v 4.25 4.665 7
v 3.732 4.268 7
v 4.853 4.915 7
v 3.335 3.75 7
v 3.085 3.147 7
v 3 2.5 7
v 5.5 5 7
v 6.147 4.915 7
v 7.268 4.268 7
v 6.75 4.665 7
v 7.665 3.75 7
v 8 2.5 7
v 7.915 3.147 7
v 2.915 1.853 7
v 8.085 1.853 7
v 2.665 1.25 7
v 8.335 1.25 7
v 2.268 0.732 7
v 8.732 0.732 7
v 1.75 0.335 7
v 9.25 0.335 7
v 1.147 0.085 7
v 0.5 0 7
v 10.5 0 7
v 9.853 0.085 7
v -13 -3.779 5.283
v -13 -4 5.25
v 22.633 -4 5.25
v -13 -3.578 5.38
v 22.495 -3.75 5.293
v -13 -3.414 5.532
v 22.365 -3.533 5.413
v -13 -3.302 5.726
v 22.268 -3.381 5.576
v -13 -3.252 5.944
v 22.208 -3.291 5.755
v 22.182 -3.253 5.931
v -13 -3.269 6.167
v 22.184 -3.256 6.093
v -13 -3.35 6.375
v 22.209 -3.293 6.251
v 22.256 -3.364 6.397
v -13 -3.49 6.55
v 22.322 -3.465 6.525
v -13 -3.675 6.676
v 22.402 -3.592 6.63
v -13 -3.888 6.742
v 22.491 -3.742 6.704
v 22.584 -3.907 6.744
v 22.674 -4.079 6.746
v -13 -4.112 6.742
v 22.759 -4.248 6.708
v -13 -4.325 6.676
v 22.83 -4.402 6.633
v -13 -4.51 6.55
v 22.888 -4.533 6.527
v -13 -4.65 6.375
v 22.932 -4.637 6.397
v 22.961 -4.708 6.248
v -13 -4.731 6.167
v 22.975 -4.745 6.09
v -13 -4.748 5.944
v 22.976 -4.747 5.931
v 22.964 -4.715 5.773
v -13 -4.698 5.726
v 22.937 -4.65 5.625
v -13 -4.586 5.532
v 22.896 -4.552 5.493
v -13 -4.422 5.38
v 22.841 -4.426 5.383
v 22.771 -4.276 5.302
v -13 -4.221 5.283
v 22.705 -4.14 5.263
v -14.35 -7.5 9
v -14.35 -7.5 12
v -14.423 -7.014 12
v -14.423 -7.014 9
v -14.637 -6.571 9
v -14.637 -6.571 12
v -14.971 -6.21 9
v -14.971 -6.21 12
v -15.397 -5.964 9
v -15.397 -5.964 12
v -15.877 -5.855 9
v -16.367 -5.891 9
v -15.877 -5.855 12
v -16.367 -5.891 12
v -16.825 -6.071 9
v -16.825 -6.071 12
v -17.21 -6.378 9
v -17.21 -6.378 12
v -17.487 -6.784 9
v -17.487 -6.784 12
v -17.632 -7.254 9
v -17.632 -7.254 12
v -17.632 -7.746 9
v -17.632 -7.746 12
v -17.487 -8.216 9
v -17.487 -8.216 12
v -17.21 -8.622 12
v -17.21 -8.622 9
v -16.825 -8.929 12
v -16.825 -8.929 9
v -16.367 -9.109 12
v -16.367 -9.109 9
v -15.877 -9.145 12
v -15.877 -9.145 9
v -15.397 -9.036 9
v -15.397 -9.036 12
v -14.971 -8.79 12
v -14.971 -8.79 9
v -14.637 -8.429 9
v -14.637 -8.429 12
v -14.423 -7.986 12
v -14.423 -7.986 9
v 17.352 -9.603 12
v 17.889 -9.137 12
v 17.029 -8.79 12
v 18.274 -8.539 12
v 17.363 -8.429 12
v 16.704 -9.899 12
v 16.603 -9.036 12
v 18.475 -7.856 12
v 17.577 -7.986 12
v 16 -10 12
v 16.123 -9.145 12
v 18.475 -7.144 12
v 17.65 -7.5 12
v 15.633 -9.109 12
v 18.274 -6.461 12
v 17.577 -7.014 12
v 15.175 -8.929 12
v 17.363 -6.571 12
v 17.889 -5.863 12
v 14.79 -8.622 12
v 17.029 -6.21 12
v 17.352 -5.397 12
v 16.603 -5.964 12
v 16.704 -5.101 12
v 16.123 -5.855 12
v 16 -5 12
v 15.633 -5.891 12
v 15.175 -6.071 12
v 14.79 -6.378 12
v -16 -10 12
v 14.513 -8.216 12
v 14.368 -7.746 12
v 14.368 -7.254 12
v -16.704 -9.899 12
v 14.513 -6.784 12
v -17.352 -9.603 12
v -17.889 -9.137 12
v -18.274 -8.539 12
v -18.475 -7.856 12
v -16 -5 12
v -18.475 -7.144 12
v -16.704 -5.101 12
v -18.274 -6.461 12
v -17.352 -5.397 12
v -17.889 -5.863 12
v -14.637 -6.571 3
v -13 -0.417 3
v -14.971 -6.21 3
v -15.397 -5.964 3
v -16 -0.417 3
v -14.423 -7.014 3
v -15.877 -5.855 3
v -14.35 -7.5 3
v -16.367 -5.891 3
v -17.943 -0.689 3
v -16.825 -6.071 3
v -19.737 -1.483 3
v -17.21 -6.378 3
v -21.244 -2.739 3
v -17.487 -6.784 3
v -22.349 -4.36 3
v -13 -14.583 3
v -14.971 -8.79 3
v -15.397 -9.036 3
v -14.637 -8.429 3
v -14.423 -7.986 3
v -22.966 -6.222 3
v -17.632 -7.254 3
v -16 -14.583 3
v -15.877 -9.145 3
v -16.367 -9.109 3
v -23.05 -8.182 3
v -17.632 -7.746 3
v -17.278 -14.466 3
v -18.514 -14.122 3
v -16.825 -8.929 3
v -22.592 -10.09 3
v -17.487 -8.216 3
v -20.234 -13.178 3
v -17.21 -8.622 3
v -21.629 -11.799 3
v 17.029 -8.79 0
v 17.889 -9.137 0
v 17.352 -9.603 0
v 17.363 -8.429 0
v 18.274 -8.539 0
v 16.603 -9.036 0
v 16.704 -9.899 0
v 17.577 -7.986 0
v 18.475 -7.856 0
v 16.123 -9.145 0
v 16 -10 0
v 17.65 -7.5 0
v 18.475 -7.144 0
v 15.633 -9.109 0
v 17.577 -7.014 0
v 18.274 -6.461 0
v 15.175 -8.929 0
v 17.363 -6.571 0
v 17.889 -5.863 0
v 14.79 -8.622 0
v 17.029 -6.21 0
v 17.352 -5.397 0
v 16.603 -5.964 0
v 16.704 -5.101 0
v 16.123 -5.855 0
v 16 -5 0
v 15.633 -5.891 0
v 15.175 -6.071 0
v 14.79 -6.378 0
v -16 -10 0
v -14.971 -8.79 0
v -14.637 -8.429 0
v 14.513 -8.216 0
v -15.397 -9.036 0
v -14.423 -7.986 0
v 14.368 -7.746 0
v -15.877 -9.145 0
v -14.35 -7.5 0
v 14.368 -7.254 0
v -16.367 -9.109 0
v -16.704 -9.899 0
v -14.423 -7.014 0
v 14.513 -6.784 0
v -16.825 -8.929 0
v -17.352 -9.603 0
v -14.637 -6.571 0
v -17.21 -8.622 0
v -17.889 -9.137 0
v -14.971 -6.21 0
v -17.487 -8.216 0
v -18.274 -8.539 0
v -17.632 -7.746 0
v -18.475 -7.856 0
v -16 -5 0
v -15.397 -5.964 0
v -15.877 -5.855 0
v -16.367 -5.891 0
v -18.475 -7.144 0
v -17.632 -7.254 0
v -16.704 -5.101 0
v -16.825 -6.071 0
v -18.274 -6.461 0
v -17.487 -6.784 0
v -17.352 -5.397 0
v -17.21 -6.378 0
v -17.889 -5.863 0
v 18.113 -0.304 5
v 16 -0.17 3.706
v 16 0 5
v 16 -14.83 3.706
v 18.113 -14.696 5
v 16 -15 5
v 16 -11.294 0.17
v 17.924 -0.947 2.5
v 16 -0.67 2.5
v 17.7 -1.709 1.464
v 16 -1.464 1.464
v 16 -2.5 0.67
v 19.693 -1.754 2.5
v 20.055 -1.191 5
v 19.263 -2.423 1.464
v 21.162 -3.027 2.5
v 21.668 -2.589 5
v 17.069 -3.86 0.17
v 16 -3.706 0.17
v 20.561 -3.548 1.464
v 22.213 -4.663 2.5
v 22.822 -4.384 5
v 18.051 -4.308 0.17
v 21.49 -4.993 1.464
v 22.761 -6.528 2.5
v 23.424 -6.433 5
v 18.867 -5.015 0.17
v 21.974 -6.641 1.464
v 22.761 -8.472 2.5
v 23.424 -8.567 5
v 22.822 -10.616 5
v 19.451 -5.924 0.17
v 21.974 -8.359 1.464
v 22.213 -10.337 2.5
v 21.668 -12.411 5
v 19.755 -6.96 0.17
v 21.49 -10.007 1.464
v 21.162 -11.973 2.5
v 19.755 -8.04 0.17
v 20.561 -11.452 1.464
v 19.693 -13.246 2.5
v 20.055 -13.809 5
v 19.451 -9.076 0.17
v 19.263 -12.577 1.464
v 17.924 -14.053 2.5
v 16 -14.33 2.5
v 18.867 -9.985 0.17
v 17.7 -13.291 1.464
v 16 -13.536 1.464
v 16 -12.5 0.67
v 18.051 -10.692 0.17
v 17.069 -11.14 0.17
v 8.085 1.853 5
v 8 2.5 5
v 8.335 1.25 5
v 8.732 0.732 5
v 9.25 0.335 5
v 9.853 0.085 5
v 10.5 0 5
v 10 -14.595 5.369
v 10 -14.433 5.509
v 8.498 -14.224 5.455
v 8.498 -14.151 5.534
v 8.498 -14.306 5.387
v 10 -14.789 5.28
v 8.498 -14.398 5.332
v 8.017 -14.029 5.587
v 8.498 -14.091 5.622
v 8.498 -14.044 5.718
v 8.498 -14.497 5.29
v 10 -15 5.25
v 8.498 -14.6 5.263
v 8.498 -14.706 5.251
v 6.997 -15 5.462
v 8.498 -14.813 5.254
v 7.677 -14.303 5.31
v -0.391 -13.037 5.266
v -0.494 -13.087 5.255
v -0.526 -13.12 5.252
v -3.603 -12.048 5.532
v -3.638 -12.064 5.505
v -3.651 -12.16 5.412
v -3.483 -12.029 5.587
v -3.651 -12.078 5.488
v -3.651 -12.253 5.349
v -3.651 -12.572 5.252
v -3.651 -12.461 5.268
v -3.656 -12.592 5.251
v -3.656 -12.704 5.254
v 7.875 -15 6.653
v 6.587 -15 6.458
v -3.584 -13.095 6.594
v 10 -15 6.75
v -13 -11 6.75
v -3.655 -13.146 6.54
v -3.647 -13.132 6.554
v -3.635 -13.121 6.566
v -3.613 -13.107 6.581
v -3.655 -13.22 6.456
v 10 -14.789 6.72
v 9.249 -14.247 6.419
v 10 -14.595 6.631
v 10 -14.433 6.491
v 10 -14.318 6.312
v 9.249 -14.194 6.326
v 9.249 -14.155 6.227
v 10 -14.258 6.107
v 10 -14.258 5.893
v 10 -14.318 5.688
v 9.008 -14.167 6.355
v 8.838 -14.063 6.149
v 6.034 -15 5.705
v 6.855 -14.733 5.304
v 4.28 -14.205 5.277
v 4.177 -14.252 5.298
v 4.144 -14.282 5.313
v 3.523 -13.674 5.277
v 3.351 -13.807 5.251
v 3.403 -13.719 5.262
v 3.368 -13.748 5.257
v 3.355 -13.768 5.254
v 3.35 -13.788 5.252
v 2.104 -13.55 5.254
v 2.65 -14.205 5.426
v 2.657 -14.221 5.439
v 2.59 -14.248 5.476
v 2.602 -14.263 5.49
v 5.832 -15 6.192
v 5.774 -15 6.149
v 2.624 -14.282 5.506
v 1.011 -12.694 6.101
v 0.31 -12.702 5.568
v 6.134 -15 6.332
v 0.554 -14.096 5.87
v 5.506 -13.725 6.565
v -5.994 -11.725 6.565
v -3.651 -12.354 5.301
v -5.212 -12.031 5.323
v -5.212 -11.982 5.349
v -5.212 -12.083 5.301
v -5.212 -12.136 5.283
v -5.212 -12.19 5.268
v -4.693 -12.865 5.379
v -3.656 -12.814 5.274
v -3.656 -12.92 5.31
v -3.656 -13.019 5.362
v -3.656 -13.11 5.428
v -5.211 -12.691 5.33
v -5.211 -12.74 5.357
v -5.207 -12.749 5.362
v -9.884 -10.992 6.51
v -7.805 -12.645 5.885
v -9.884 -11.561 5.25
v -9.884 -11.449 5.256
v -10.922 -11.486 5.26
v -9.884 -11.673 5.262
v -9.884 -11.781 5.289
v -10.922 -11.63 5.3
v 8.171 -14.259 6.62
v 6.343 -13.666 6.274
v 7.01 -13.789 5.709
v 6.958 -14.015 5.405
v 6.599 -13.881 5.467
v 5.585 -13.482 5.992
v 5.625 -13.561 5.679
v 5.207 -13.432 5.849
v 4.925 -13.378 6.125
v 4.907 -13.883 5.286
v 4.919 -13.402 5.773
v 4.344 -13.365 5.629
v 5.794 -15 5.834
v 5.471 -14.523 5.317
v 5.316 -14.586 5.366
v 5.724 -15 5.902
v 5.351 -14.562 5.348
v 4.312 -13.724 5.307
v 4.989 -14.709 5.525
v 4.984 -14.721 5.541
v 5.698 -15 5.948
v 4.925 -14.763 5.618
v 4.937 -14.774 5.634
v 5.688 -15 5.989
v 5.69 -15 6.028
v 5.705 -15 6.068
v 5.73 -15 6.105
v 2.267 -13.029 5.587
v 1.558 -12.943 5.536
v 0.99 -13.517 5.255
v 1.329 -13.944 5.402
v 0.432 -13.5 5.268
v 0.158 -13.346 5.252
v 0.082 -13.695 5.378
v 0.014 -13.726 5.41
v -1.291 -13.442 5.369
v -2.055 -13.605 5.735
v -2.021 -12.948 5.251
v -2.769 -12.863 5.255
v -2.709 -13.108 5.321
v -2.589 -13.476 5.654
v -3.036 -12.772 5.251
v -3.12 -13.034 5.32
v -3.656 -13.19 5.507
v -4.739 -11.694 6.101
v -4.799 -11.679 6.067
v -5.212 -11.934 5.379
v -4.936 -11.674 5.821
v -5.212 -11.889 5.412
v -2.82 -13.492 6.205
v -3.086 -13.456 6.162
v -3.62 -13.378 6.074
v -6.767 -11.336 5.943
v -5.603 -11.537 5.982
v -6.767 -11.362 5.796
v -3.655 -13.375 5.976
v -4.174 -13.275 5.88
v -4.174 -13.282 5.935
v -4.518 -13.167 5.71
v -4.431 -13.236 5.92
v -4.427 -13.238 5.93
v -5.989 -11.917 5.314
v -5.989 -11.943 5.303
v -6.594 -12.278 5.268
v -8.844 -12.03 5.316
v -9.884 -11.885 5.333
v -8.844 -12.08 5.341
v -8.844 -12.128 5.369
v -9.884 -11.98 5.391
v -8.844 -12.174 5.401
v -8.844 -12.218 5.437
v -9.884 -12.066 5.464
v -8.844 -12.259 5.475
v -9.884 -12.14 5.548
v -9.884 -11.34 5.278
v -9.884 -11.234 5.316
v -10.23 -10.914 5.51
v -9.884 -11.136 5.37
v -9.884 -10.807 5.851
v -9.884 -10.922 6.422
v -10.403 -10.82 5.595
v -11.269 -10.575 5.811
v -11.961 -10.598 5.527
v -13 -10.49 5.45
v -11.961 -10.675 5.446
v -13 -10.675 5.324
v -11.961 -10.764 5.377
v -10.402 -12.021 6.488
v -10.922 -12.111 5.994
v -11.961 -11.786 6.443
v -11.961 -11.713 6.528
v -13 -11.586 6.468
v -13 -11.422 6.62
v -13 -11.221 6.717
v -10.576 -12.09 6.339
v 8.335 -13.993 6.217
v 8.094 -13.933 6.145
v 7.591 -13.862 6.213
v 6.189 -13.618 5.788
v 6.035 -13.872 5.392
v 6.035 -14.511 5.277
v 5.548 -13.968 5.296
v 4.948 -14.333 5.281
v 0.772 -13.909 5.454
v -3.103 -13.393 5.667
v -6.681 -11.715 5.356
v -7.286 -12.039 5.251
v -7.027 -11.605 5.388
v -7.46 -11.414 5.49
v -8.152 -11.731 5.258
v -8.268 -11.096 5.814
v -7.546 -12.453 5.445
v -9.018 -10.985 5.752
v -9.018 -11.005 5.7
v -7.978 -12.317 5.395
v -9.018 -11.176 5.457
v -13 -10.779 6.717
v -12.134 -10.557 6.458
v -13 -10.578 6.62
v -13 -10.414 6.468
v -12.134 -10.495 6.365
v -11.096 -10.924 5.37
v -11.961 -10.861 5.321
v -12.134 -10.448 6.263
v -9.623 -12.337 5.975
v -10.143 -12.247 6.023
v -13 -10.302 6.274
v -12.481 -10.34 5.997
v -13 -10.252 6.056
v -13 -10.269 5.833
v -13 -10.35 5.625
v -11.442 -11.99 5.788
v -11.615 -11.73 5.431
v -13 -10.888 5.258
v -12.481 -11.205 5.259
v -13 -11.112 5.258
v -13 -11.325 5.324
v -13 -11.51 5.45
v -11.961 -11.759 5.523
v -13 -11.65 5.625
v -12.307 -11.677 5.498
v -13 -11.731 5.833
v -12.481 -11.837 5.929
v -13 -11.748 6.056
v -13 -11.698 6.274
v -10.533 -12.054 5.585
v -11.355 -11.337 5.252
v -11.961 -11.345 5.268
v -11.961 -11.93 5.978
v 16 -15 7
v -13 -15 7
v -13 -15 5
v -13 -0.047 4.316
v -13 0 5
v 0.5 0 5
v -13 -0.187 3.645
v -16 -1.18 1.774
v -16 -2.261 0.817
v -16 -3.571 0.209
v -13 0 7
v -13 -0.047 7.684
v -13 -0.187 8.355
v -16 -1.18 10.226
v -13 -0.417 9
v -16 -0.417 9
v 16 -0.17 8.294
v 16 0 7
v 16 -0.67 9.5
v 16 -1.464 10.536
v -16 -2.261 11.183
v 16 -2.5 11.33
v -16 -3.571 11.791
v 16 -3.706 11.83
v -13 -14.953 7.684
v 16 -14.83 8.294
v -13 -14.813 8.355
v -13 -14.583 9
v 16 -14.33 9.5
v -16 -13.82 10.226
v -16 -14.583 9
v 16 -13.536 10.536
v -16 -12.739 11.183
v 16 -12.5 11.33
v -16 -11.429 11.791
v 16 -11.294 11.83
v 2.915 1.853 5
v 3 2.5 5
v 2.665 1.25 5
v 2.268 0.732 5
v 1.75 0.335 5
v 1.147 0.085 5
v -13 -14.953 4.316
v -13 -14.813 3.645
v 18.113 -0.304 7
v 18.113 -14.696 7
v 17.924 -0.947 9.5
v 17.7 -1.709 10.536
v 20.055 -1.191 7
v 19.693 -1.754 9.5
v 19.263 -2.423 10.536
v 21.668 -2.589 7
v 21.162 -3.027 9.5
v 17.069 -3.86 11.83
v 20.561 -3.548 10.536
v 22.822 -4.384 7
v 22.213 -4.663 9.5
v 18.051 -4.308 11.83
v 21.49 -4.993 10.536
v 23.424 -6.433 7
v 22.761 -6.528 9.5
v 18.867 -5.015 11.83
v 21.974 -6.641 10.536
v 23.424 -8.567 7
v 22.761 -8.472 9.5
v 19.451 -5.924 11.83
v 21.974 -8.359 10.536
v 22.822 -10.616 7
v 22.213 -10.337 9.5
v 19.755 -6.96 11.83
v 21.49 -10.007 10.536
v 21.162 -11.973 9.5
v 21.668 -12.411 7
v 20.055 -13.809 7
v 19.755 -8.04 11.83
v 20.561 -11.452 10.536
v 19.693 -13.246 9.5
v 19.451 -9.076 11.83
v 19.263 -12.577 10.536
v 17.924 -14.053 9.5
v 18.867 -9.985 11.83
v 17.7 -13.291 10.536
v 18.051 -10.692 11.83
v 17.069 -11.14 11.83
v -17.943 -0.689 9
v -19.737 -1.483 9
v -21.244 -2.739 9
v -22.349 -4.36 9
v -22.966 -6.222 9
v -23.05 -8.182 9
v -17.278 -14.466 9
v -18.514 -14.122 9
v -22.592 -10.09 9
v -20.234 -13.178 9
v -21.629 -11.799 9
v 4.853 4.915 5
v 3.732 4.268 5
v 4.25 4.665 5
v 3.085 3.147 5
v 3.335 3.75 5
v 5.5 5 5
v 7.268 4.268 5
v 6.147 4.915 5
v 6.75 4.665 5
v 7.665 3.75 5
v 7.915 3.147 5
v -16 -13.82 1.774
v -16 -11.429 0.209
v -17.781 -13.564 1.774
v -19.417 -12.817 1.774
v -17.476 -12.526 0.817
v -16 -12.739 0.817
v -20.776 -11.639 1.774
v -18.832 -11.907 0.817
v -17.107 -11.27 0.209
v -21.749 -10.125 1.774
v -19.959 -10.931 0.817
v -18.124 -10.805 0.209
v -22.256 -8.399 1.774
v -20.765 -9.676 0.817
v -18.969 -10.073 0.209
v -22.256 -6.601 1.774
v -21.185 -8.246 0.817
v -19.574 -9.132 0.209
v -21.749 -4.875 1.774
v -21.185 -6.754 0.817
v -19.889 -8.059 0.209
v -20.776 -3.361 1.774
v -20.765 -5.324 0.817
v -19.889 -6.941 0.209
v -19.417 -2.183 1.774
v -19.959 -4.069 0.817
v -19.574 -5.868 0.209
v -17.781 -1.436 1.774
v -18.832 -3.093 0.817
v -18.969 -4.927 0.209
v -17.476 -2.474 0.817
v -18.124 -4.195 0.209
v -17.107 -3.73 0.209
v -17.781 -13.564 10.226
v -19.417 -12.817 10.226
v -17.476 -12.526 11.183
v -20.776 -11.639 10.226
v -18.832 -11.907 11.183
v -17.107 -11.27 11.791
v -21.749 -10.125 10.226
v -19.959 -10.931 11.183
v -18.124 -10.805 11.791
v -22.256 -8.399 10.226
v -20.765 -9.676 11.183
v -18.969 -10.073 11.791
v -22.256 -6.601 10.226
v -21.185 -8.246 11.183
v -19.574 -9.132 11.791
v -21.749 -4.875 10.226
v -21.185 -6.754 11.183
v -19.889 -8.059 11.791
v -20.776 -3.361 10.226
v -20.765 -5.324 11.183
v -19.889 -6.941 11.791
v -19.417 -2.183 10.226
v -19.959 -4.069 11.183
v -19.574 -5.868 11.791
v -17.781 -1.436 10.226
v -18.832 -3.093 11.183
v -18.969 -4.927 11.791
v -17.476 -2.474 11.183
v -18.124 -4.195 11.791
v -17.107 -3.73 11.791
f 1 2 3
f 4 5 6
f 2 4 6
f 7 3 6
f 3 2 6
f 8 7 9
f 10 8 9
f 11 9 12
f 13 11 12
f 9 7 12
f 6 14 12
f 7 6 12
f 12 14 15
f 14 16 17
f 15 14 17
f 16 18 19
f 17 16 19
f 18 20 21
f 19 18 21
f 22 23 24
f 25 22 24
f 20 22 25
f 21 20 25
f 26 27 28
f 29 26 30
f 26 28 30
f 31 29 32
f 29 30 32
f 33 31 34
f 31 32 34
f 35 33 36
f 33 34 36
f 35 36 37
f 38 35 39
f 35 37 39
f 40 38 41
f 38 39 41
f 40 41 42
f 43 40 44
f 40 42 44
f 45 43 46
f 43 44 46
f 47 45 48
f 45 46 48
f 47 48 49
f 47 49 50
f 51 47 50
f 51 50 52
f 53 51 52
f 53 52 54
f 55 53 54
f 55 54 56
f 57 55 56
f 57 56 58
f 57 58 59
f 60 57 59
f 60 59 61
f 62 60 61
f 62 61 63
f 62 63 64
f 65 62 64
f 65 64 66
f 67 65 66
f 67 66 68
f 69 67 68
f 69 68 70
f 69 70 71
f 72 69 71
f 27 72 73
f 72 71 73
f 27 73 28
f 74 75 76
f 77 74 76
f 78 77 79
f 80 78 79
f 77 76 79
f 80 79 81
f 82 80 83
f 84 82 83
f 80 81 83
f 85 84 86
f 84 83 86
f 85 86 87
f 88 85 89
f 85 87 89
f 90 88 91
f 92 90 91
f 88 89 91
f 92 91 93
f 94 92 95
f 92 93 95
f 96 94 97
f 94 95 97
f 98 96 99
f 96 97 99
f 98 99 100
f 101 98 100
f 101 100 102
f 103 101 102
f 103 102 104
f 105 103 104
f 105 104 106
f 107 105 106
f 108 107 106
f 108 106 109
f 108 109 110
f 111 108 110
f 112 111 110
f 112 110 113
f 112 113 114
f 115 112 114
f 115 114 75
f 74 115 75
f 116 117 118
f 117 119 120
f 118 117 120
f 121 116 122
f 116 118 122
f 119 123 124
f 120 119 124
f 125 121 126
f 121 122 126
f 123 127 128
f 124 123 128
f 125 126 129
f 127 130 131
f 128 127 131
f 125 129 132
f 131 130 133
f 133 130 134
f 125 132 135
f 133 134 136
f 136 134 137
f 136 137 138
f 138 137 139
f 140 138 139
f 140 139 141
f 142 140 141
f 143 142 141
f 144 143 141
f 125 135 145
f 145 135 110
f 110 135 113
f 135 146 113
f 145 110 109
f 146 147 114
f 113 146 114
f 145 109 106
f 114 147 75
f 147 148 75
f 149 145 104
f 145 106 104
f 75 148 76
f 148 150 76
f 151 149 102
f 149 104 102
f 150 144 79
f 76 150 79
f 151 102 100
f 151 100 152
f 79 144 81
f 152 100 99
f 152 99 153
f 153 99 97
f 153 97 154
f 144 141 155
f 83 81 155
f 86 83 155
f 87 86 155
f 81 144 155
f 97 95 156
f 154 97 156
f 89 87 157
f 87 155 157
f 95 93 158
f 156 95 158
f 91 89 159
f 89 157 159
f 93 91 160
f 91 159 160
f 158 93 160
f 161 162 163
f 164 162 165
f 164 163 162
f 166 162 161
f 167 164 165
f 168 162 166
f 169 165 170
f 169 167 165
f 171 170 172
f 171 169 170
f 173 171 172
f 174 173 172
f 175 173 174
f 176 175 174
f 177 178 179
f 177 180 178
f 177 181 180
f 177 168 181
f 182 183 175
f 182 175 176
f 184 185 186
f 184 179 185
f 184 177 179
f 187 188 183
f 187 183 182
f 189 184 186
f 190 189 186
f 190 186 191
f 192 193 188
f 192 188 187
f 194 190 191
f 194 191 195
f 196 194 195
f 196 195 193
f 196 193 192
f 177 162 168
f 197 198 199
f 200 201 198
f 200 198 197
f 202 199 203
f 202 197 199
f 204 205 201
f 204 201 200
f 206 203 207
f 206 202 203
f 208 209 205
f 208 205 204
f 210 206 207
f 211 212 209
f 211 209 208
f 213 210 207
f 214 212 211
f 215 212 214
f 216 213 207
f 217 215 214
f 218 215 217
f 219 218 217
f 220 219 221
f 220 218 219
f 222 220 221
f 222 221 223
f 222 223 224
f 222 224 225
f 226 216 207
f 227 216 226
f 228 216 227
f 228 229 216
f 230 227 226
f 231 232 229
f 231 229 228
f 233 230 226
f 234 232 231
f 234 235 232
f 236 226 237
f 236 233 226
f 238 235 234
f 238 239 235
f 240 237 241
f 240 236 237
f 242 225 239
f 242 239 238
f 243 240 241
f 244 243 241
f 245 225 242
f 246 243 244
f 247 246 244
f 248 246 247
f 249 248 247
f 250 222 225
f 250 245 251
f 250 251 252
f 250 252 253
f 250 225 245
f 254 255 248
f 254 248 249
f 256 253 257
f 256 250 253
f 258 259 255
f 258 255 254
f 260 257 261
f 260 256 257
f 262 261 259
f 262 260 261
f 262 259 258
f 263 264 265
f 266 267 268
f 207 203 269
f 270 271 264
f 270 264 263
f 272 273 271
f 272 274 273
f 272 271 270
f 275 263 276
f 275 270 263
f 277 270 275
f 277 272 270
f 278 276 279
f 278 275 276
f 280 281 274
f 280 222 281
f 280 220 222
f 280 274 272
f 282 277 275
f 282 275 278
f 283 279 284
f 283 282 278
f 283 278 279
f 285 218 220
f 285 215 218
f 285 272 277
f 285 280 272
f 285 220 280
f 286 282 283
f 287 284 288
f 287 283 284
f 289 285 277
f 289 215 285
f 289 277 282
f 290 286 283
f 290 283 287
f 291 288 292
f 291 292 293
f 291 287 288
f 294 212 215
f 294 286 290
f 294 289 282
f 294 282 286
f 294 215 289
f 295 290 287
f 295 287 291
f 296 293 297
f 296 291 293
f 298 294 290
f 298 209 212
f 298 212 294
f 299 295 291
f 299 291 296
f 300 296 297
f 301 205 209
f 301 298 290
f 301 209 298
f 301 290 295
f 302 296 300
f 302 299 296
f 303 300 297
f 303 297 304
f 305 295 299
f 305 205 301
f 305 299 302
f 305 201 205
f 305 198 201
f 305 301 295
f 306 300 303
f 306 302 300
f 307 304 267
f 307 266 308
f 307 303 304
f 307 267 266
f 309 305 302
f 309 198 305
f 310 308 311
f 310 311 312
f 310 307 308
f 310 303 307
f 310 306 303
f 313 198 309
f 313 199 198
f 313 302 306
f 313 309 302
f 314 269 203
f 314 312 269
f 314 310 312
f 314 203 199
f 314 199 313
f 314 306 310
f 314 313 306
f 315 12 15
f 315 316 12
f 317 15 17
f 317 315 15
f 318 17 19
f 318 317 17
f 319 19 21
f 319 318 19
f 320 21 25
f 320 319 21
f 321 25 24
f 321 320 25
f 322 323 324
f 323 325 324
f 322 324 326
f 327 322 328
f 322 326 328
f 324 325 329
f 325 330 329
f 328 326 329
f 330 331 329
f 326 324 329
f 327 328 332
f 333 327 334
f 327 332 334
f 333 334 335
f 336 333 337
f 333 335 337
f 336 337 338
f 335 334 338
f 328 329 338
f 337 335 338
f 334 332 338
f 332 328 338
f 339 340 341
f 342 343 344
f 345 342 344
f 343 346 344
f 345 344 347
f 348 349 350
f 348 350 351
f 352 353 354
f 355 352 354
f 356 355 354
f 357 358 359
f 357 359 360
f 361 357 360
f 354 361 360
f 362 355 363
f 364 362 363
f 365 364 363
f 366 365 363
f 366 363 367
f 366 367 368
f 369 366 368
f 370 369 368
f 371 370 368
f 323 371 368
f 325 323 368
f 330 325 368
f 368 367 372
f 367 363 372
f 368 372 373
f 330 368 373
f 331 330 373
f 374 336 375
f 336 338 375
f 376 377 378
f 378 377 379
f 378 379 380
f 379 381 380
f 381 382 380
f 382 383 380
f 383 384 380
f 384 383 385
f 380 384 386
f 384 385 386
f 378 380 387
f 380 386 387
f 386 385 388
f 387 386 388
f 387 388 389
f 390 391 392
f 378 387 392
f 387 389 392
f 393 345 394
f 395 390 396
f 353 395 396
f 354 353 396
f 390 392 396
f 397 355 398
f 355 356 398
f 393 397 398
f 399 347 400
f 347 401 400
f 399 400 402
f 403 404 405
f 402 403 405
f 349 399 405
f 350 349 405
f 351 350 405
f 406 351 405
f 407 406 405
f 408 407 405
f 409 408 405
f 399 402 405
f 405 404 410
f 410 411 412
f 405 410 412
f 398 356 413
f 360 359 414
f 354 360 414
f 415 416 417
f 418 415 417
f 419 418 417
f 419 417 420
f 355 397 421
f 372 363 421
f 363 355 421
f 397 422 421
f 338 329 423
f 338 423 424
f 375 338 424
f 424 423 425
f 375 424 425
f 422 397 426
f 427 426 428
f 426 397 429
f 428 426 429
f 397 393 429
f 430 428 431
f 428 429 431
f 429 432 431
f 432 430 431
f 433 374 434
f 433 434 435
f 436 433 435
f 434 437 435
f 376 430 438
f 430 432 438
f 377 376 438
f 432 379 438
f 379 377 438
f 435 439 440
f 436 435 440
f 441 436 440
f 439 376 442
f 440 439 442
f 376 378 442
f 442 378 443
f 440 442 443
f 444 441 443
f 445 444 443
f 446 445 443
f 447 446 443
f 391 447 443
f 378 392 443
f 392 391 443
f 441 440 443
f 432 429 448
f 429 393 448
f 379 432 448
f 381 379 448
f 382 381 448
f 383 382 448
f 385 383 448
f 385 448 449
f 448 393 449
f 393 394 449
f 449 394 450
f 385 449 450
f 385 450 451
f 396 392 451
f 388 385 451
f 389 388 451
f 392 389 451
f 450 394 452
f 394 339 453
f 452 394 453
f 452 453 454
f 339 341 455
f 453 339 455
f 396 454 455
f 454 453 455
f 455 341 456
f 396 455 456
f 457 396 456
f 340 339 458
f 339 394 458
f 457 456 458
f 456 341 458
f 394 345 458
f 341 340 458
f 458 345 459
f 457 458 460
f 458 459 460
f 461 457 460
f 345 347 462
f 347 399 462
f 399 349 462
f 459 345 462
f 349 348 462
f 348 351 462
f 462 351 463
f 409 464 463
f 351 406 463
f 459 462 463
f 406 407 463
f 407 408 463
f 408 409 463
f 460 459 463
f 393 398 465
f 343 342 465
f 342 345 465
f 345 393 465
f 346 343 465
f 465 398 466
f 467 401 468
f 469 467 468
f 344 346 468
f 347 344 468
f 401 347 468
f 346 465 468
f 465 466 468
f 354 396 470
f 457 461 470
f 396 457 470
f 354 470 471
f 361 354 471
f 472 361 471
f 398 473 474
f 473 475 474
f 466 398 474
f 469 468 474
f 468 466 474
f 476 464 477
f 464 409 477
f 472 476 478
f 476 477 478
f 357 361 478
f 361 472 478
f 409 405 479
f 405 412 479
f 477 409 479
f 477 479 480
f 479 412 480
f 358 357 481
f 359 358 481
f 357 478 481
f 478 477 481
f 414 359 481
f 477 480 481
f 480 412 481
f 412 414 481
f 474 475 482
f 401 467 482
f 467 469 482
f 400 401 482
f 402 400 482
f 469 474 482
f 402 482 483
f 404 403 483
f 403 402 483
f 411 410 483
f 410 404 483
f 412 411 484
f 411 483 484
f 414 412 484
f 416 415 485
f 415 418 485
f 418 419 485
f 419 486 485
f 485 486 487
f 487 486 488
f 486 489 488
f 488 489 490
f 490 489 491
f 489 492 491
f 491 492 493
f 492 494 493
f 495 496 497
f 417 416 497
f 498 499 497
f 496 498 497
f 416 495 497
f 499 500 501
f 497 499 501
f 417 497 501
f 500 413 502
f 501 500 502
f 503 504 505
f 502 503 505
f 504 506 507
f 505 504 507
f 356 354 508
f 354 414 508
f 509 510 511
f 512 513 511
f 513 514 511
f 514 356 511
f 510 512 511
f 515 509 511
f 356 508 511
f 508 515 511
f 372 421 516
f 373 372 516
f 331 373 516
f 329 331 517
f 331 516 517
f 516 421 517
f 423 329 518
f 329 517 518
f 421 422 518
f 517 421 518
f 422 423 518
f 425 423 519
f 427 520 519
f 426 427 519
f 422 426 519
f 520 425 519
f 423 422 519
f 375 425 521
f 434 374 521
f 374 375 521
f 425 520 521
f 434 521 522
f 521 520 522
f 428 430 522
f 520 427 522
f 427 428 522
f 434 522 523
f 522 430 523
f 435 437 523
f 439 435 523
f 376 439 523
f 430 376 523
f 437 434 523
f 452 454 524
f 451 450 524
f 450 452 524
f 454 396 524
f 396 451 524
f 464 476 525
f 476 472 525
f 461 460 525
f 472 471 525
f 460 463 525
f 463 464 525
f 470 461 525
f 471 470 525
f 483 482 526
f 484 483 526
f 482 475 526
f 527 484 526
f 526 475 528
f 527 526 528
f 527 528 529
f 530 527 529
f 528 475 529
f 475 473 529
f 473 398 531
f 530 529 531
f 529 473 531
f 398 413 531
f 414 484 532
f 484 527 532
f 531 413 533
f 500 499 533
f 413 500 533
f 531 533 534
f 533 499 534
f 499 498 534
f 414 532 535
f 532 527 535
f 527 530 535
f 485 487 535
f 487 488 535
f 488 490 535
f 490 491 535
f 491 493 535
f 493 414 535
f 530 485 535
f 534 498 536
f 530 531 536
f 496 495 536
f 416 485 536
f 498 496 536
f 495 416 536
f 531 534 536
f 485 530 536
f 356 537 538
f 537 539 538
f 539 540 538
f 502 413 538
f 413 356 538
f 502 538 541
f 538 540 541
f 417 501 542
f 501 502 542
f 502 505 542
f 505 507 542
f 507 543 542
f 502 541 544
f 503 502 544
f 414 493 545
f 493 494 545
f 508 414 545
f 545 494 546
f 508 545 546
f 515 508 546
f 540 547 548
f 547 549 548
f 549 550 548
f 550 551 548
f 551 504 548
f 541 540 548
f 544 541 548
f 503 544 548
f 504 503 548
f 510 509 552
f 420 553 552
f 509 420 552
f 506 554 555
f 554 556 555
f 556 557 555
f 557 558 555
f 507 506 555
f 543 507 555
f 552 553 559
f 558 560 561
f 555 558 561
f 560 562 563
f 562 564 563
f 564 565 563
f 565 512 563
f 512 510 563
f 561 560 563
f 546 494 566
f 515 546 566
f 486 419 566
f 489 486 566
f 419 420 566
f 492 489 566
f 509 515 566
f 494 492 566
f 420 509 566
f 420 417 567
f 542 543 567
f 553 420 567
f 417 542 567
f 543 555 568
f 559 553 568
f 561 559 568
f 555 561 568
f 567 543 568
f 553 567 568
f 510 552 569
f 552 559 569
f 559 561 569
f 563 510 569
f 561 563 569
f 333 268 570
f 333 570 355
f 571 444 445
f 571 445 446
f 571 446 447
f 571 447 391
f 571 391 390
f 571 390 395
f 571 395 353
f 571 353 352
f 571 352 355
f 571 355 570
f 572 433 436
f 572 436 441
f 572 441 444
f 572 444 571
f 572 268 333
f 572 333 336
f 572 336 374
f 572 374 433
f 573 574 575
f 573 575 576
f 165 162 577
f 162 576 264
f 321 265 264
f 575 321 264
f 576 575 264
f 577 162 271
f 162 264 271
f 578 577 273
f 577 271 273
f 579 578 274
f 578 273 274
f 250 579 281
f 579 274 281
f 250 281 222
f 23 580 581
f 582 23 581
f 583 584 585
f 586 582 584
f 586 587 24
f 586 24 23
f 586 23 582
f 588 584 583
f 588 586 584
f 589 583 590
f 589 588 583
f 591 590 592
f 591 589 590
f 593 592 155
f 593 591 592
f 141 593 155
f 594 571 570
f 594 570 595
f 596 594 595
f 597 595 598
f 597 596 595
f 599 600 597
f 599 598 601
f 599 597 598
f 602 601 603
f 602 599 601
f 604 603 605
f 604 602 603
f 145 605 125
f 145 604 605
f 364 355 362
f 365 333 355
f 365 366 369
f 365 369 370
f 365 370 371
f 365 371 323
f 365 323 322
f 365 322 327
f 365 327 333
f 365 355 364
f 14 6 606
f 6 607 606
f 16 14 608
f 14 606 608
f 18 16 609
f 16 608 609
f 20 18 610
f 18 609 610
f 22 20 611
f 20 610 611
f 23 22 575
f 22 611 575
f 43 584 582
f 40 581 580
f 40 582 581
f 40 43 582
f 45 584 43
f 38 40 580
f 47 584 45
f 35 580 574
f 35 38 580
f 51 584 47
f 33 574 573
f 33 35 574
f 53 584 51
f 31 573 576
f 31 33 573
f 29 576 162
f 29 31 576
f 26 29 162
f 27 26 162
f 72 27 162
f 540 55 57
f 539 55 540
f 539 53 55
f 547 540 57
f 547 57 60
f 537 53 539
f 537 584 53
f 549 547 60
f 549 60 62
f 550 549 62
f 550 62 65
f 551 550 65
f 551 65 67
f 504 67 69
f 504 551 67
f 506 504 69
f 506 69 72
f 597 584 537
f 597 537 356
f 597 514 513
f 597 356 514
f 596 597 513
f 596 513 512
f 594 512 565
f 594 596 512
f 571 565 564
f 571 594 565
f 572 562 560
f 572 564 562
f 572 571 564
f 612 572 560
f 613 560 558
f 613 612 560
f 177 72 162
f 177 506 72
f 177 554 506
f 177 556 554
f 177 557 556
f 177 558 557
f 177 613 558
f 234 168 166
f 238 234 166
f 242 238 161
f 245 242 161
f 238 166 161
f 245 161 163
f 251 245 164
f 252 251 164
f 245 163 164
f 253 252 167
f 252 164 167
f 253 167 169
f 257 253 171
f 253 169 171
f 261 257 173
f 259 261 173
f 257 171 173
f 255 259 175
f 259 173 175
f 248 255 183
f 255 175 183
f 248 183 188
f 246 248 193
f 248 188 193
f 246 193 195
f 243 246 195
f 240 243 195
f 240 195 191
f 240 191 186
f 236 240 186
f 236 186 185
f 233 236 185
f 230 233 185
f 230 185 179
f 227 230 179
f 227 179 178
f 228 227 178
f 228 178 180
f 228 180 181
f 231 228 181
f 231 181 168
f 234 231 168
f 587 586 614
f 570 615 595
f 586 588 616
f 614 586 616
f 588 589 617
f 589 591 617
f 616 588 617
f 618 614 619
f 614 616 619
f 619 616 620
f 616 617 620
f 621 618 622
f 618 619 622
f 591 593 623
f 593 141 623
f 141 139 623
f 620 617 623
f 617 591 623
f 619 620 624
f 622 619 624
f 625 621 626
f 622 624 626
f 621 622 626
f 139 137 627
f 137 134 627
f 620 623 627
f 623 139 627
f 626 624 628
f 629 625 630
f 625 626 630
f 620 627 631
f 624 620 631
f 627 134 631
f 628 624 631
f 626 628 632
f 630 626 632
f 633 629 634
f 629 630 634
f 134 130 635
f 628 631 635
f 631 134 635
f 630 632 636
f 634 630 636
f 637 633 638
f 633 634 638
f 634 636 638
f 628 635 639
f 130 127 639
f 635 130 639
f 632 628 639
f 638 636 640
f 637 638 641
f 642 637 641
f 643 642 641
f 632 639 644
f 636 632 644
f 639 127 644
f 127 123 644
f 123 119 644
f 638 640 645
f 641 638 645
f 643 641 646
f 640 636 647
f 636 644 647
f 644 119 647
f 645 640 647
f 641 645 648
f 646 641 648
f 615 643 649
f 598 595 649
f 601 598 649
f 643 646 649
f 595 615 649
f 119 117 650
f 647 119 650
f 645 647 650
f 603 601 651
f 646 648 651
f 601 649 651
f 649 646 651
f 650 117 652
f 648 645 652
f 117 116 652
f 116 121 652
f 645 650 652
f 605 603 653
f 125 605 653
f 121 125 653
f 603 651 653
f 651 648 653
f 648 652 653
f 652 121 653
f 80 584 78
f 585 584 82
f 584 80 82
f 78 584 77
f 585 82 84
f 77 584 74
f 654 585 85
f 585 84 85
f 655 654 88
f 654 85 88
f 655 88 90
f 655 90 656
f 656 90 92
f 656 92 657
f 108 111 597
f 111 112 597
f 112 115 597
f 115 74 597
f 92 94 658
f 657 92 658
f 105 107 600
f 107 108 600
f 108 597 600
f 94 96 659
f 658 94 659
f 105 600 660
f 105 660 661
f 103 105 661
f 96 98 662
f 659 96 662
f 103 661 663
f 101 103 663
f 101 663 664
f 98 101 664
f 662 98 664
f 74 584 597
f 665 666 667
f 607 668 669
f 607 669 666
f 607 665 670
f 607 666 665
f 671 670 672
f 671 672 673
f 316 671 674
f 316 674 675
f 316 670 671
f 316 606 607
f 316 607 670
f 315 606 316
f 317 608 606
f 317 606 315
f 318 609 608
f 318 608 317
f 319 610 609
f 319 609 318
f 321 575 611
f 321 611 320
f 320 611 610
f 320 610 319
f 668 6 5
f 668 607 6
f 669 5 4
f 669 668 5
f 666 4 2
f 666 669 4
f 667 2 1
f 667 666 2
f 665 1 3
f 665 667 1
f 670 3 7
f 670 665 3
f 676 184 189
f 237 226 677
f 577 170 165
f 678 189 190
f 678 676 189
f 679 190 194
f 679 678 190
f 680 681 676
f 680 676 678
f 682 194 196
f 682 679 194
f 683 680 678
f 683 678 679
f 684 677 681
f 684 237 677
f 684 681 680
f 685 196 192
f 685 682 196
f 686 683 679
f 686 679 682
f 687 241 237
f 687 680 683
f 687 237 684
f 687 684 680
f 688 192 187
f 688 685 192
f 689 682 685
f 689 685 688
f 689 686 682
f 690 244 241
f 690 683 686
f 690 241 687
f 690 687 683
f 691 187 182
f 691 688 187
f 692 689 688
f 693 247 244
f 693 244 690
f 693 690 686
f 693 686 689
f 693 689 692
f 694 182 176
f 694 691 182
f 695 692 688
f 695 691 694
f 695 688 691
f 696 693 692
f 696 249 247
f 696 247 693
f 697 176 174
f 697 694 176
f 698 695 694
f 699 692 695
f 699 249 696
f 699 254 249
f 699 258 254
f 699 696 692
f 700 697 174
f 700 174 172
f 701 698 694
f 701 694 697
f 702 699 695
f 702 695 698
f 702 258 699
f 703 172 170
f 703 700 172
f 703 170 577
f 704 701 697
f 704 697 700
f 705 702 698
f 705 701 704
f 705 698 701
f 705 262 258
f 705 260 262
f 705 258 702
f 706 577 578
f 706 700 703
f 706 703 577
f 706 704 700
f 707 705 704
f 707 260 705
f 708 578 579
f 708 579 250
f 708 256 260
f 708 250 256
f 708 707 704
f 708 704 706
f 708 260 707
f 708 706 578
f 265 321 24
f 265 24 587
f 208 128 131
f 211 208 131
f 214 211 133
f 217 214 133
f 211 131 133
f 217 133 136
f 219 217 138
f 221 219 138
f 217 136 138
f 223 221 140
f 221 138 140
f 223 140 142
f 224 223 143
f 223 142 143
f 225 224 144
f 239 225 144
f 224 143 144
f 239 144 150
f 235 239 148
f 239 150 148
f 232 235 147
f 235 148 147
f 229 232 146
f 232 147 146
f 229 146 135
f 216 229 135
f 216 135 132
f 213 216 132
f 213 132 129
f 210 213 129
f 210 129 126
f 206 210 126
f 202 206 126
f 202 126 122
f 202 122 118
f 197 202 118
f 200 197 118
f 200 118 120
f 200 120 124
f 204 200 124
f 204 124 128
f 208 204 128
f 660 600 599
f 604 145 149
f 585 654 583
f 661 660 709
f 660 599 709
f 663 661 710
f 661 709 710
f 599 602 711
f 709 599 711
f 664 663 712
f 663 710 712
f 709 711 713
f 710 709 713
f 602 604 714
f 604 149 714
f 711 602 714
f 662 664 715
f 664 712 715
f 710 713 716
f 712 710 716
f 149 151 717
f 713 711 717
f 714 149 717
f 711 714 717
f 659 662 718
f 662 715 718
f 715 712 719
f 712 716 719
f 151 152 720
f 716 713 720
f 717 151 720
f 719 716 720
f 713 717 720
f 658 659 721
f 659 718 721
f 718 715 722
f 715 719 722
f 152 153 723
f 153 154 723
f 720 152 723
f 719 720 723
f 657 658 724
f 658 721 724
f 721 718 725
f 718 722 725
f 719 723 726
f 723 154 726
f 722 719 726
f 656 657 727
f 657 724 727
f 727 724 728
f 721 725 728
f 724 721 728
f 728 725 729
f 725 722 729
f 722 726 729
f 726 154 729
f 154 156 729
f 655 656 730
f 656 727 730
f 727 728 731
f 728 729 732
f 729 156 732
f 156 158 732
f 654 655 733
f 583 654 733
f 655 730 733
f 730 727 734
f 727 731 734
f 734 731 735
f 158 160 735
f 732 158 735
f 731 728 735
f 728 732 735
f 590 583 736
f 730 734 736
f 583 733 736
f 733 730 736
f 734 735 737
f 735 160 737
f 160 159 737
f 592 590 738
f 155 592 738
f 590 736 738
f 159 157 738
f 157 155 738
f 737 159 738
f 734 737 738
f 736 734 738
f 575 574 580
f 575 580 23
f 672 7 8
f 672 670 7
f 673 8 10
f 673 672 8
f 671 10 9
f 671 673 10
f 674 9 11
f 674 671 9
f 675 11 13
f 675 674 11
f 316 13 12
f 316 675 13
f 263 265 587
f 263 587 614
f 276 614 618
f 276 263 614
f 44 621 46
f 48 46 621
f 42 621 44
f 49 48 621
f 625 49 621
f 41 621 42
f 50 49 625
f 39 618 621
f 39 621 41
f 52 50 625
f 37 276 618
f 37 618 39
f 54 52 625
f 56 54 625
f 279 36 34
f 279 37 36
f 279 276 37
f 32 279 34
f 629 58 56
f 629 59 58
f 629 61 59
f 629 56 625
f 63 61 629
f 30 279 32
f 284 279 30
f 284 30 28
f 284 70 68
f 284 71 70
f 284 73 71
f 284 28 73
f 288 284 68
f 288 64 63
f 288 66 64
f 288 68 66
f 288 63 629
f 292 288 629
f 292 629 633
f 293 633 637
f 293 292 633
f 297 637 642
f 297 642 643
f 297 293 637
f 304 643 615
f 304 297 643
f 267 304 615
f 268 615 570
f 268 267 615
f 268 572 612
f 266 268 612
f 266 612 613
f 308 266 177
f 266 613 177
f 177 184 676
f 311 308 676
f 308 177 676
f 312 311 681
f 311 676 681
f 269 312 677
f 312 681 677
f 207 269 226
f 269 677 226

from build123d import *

# Parameters (mm, degrees)
BOSS_EXTRUDE1_DEPTH = 12
FILLET1_R           = 5
SKETCH5_W           = 10.5
SKETCH5_H           = 6
CUT_EXTRUDE3_DEPTH  = 37.349002737
SKETCH6_W           = 5
SKETCH6_H           = 2
BOSS_EXTRUDE2_DEPTH = 5
FILLET2_R           = 2.5
FILLET3_R           = 2.5
SKETCH3_R           = 1.65
CUT_EXTRUDE4_DEPTH  = 31.352100461
SKETCH8_R           = 0.75
CUT_EXTRUDE7_DEPTH  = 51.387859352
SKETCH9_R           = 0.75
CUT_EXTRUDE9_DEPTH  = 23.34523506


with BuildPart() as part:
    # Sketch2 → Boss-Extrude1 (new body)
    with BuildSketch(Plane.XY):
        with BuildLine():
            Line((-16, 0), (16, 0))
            ThreePointArc((16, 0), (23.5, -7.5), (16, -15))
            Line((16, -15), (-16, -15))
            ThreePointArc((-16, -15), (-23.5, -7.5), (-16, 0))
        make_face()
    extrude(amount=BOSS_EXTRUDE1_DEPTH)

    # Fillet1
    fillet1_edges = [part.edges().sort_by_distance(p)[0] for p in [
        (-23.5, -7.5, 12),
        (0, -15, 12),
        (23.5, -7.5, 12),
        (0, -15, 0),
        (-23.5, -7.5, 0),
        (0, 0, 0),
        (23.5, -7.5, 0),
        (0, 0, 12),
    ]]
    fillet(fillet1_edges, radius=FILLET1_R)

    # Sketch5 → Cut-Extrude3 (cut, through all)
    with BuildSketch(Plane(origin=(0, -25, 0), x_dir=(-1, 0, 0), z_dir=(0, -1, 0))):
        with Locations((18.25, -6)):
            Rectangle(SKETCH5_W, SKETCH5_H)
    extrude(amount=-CUT_EXTRUDE3_DEPTH, mode=Mode.SUBTRACT)

    # Sketch6 → Boss-Extrude2 (add)
    with BuildSketch(Plane(origin=(0, 0, 0), x_dir=(1, 0, 0), z_dir=(0, 1, 0))):
        with Locations((5.5, -6)):
            Rectangle(SKETCH6_W, SKETCH6_H)
    extrude(amount=BOSS_EXTRUDE2_DEPTH)

    # Fillet2
    fillet2_edges = [part.edges().sort_by_distance(p)[0] for p in [
        (8, 5, 6),
        (3, 5, 6),
    ]]
    fillet(fillet2_edges, radius=FILLET2_R - 0.0001)  # a hair under: the kernel refuses the full size

    # Fillet3
    fillet3_edges = [part.edges().sort_by_distance(p)[0] for p in [
        (3, 0, 6),
        (8, 0, 6),
    ]]
    fillet(fillet3_edges, radius=FILLET3_R)

    # Sketch3 → Cut-Extrude4 (cut, through all)
    with BuildSketch(Plane.XY.offset(12)):
        with Locations((-16, -7.5)):
            Circle(SKETCH3_R)
        with Locations((16, -7.5)):
            Circle(SKETCH3_R)
    extrude(amount=-CUT_EXTRUDE4_DEPTH, mode=Mode.SUBTRACT)

    # Sketch8 → Cut-Extrude7 (cut, through all)
    with BuildSketch(Plane(origin=(23.5, 0, 0), x_dir=(0, 0, -1), z_dir=(1, 0, 0))):
        with Locations((-6, -4)):
            Circle(SKETCH8_R)
    extrude(amount=-CUT_EXTRUDE7_DEPTH, mode=Mode.SUBTRACT)

    # Sketch9 → Cut-Extrude9 (cut, along a direction that is not the sketch's normal)
    with BuildSketch(Plane.ZY.offset(13)):
        with Locations((6, -11)):
            Circle(SKETCH9_R)
    extrude(amount=-CUT_EXTRUDE9_DEPTH, dir=(-0.9852117548196745, 0.17134117475124766, 0), mode=Mode.SUBTRACT)


solid = part.part
